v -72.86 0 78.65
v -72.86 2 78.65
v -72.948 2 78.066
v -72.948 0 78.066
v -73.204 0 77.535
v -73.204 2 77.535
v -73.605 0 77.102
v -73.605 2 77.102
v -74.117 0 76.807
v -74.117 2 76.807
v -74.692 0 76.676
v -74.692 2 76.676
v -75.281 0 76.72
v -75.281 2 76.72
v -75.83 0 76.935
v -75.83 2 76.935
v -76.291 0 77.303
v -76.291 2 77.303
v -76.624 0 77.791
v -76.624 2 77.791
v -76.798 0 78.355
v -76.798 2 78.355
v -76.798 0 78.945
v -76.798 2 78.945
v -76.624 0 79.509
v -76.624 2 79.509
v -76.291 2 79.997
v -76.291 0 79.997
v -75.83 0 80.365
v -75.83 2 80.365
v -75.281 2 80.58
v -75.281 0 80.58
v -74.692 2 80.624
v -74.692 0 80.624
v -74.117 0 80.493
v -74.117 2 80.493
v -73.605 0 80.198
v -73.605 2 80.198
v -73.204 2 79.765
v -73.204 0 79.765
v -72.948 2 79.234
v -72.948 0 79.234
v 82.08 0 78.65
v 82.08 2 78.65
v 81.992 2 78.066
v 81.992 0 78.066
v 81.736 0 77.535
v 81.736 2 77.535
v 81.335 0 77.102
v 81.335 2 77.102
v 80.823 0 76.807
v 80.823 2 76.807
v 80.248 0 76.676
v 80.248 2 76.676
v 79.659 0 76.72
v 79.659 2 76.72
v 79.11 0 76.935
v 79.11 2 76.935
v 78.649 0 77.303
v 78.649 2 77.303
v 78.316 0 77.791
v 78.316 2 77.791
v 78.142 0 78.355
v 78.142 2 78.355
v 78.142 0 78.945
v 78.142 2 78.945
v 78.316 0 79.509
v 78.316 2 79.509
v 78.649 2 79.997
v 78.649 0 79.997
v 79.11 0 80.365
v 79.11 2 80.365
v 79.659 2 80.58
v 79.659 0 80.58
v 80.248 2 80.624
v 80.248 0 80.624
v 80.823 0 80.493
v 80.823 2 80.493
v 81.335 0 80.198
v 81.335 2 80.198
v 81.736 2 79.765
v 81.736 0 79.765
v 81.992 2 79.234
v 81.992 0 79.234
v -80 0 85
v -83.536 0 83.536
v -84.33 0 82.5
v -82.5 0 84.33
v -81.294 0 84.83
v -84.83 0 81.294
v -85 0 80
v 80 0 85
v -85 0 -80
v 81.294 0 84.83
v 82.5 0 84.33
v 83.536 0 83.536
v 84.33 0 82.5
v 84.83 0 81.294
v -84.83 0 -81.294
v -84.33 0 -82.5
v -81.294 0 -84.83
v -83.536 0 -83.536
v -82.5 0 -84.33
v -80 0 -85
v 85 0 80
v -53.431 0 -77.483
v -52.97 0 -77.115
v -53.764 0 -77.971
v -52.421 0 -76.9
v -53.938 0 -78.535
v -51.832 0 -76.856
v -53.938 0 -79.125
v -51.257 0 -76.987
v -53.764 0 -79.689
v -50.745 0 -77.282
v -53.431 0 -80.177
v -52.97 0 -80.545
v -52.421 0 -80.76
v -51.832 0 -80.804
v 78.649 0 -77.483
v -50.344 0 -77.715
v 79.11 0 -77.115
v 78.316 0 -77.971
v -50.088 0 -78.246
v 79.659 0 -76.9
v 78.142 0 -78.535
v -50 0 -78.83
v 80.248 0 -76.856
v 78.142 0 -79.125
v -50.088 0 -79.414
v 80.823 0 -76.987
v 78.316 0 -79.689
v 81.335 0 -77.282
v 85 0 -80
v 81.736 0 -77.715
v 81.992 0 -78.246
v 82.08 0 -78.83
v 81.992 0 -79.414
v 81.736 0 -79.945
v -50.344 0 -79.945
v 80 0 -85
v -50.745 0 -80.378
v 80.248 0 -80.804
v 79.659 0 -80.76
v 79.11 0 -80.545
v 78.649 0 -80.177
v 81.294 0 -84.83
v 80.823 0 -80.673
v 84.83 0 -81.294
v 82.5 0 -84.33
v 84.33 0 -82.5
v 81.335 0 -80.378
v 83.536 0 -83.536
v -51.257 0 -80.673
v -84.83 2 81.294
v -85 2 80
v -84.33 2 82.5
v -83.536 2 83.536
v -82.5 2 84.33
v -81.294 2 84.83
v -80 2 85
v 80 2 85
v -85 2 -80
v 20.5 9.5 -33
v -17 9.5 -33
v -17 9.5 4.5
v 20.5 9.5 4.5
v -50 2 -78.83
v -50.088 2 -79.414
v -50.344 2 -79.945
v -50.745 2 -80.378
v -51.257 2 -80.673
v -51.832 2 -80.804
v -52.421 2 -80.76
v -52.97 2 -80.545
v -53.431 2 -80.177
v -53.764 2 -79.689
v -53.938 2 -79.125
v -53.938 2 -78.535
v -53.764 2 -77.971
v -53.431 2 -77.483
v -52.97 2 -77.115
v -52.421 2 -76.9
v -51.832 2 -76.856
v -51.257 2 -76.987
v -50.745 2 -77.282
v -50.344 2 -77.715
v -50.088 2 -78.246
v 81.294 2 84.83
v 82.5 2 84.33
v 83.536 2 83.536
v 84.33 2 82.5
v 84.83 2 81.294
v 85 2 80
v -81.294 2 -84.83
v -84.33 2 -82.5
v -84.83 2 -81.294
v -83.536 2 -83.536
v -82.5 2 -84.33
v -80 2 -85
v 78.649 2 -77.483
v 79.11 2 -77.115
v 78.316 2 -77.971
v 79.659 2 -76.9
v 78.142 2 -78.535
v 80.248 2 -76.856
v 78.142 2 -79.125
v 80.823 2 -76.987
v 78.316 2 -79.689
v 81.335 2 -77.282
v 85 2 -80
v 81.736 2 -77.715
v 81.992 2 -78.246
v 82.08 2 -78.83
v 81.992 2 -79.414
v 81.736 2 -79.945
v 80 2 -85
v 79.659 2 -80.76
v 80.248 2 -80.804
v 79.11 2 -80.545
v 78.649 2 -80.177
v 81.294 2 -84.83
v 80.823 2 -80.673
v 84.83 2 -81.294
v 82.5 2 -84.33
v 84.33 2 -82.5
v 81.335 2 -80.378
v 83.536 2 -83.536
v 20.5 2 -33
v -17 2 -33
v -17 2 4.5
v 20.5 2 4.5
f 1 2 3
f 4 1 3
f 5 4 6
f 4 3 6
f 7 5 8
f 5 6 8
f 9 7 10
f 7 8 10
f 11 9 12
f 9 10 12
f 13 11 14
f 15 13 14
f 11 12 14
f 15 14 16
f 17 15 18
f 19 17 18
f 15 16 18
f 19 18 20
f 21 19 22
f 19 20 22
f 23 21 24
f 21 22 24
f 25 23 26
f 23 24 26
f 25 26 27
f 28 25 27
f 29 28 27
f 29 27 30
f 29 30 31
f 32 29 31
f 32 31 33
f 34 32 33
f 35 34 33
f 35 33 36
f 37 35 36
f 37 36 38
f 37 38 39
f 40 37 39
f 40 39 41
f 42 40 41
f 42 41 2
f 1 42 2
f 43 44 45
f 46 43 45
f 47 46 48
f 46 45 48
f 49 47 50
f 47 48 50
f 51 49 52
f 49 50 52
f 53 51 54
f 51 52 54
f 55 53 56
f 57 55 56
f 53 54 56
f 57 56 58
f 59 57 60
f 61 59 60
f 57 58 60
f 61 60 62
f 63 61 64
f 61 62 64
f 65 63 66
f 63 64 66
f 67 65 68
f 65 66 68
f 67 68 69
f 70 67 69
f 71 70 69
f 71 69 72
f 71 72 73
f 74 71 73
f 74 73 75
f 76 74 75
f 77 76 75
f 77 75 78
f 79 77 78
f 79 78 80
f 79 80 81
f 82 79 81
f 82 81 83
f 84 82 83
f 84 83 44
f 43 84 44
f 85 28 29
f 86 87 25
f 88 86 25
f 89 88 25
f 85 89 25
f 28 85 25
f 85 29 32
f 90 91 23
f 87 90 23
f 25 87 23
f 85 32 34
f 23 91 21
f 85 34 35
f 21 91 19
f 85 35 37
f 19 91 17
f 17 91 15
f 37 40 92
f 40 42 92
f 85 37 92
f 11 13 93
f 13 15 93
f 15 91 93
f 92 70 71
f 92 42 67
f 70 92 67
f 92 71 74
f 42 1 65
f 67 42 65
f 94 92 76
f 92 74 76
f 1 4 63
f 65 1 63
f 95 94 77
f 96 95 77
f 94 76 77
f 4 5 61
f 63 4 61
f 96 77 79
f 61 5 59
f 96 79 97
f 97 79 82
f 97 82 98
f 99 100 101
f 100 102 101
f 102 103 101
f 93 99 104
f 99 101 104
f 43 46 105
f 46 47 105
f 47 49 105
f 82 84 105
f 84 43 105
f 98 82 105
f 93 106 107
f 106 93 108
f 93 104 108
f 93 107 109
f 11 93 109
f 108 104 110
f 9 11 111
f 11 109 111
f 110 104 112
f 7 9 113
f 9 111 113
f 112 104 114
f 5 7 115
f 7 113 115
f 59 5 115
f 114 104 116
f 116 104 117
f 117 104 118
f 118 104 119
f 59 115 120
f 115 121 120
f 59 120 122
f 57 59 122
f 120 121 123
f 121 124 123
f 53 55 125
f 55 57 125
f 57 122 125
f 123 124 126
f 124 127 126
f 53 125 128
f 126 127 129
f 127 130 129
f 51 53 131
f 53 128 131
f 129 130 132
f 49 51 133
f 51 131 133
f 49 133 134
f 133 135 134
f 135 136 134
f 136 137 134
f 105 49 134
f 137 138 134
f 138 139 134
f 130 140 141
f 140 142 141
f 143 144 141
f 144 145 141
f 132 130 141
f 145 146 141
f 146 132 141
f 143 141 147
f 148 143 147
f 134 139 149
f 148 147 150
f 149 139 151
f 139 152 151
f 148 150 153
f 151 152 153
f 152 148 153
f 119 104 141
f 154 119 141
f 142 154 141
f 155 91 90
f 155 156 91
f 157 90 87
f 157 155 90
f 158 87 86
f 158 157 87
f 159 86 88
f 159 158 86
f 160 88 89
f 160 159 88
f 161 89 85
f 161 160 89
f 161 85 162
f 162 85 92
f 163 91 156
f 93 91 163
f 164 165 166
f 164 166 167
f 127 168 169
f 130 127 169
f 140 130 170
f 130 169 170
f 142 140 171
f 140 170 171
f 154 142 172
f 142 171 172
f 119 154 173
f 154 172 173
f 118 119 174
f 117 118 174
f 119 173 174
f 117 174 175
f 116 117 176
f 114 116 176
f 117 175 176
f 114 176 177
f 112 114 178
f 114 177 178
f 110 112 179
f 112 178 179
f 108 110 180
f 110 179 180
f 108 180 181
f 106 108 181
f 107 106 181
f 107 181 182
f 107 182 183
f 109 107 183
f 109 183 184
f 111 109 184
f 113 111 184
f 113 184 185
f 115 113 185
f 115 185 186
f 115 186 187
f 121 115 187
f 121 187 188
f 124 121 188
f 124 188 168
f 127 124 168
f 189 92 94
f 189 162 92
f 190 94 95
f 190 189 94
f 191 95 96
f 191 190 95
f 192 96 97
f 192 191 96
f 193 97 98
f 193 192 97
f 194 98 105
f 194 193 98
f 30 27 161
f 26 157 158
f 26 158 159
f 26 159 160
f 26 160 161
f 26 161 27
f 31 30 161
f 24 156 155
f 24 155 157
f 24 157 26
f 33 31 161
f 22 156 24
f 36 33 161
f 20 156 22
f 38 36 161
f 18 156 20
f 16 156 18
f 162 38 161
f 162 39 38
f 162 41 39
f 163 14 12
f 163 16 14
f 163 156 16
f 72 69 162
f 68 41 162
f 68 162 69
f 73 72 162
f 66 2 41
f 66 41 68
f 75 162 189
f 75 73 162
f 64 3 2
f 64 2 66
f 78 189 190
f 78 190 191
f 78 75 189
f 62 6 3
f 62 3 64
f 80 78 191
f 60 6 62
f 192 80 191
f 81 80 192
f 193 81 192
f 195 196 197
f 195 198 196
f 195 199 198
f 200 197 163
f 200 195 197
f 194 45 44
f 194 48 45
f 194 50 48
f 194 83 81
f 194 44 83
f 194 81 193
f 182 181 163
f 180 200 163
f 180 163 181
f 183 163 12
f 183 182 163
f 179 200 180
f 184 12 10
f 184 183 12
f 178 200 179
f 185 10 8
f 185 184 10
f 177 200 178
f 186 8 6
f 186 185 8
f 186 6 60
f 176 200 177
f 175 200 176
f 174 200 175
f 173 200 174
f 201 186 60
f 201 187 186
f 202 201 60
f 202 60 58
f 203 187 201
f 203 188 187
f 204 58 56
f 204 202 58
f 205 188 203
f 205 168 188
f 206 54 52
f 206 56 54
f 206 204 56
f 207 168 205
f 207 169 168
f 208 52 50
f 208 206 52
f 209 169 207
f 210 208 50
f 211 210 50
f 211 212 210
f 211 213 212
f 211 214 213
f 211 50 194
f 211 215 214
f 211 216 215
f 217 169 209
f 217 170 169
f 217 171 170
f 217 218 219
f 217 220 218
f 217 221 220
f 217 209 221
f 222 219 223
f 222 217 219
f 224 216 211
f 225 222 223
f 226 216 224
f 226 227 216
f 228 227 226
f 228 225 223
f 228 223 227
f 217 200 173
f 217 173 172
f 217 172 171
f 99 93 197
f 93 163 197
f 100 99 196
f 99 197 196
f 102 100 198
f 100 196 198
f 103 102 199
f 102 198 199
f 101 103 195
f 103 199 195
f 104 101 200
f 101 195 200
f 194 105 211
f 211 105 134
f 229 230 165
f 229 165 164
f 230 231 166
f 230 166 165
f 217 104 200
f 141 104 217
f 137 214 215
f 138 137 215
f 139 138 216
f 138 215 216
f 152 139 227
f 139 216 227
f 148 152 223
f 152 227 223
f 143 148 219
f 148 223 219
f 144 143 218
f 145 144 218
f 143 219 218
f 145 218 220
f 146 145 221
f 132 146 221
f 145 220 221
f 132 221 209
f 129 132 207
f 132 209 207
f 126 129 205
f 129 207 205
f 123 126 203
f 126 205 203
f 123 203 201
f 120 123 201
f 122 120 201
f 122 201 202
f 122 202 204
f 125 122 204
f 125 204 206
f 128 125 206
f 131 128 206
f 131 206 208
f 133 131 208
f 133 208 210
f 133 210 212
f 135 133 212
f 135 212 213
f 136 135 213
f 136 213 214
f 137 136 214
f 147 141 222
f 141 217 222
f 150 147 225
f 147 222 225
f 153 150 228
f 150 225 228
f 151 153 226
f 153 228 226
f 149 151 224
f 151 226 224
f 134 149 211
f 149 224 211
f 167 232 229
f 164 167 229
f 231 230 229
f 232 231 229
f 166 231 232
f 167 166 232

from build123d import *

# Parameters (mm, degrees)
SKETCH_1_W          = 170
SKETCH_1_H          = 170
EXTRUDE_1_DEPTH     = 2
SKETCH_2_R          = 1.98
CUT_EXTRUDE_1_DEPTH = 3
FILLET_1_R          = 5
SKETCH_4_W          = 37.5
SKETCH_4_H          = 37.5
EXTRUDE_2_DEPTH     = 7.5


with BuildPart() as part:
    # 스케치1 → 보스-돌출1 (new body)
    with BuildSketch(Plane(origin=(0, 0, 0), x_dir=(1, 0, 0), z_dir=(0, 1, 0))):
        Rectangle(SKETCH_1_W, SKETCH_1_H)
    extrude(amount=EXTRUDE_1_DEPTH)

    # 스케치2 → 컷-돌출1 (cut, through all)
    with BuildSketch(Plane(origin=(0, 2, 0), x_dir=(1, 0, 0), z_dir=(0, 1, 0))):
        with Locations((-74.84, -78.65)):
            Circle(SKETCH_2_R)
        with Locations((-51.98, 78.83)):
            Circle(SKETCH_2_R)
        with Locations((80.1, 78.83)):
            Circle(SKETCH_2_R)
        with Locations((80.1, -78.65)):
            Circle(SKETCH_2_R)
    extrude(amount=-CUT_EXTRUDE_1_DEPTH, mode=Mode.SUBTRACT)

    # 필렛1
    fillet_1_edges = [part.edges().sort_by_distance(p)[0] for p in [
        (85, 1, 85),
        (-85, 1, 85),
        (-85, 1, -85),
        (85, 1, -85),
    ]]
    fillet(fillet_1_edges, radius=FILLET_1_R)


with BuildPart() as body_2:
    # 스케치4 → 보스-돌출2 (new body)
    with BuildSketch(Plane(origin=(0, 2, 0), x_dir=(1, 0, 0), z_dir=(0, 1, 0))):
        with Locations((1.75, 14.25)):
            Rectangle(SKETCH_4_W, SKETCH_4_H)
    extrude(amount=EXTRUDE_2_DEPTH)


solid = Compound([part.part, body_2.part])
